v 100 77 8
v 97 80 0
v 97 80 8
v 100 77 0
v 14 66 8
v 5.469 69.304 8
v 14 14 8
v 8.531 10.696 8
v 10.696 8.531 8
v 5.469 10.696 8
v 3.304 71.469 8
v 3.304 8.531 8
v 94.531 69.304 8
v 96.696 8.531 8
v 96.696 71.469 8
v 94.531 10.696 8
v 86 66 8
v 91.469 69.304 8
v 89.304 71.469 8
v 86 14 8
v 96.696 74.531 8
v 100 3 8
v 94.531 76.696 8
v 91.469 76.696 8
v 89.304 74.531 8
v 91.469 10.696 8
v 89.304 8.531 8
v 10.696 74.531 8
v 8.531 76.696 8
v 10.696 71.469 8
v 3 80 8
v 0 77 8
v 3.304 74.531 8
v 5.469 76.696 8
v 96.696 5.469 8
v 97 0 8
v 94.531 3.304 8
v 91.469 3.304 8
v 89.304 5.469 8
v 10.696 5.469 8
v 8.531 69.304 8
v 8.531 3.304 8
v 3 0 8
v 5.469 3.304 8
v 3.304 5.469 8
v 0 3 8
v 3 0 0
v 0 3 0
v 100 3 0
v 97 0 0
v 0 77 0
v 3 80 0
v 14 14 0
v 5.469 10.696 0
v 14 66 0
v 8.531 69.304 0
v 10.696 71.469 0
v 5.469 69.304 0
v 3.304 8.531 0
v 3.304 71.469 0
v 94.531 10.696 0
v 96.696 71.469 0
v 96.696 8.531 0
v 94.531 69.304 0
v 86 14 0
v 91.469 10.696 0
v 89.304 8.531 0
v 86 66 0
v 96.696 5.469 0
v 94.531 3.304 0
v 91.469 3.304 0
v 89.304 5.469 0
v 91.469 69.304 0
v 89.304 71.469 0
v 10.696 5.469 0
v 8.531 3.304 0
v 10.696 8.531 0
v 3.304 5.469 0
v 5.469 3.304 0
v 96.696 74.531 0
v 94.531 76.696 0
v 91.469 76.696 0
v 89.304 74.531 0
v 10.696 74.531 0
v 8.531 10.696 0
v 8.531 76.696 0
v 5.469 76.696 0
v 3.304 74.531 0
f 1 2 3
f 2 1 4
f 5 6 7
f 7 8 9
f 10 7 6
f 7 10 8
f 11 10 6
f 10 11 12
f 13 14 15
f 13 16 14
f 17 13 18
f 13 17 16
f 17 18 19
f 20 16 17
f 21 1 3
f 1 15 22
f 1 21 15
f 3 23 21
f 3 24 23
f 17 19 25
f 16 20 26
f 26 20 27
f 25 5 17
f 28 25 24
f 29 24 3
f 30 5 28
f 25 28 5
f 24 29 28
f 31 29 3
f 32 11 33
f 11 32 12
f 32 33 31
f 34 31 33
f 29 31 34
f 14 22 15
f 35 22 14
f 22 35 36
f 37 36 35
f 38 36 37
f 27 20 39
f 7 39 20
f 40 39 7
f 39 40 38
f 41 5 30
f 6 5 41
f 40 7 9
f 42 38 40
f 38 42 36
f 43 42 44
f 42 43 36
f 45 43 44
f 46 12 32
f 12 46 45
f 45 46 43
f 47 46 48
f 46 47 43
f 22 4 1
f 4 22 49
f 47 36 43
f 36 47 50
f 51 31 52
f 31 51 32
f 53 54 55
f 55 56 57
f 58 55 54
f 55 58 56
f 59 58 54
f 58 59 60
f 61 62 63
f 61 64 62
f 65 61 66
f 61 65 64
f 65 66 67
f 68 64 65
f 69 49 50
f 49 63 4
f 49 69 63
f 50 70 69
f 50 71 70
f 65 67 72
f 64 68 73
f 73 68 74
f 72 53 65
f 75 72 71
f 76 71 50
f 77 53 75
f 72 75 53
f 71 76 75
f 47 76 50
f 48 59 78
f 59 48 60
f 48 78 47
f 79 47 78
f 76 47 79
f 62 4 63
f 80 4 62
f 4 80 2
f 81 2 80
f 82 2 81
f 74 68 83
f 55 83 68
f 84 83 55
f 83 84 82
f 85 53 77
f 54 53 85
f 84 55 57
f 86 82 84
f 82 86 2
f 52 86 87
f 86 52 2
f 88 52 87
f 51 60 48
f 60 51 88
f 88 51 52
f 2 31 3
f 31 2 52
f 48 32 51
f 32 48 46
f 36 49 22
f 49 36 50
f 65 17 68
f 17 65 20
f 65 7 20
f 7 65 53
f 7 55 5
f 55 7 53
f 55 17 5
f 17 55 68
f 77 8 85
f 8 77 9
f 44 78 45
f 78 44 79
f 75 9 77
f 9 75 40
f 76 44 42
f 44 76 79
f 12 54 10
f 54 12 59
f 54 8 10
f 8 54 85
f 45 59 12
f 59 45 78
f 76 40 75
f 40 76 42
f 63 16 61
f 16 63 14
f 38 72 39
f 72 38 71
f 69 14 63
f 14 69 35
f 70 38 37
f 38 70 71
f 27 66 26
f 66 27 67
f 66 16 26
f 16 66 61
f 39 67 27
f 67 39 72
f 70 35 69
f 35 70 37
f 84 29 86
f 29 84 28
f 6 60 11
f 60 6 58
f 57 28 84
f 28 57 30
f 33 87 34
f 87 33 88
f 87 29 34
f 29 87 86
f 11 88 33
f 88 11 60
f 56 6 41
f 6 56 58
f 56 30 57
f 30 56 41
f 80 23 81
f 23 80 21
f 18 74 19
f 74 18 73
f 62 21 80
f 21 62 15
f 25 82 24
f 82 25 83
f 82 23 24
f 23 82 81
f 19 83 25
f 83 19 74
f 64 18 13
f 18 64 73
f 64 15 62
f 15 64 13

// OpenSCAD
$fn = 32;

// ----------------------------------------------------------------------
// Frame plate: 100 x 80 frame, 14 mm rails
// ----------------------------------------------------------------------

// --- parameters (mm) ---
plate_l = 100;            // plate length, X
plate_w = 80;             // plate width, Y
plate_t = 8;              // plate thickness, Z (extrusion height)
corner_c = 3;             // corner chamfer
frame_bar = 14;           // frame rail width
bolt_r = 4;               // corner bolt window radius
bolt_inset = 7;           // bolt centre inset from the edges

win_l = plate_l - 2 * frame_bar;  // window length
win_w = plate_w - 2 * frame_bar;  // window width
bolt_d = 2 * bolt_r;  // corner hole diameter

profile = [[3, 0], [97, 0], [100, 3], [100, 77], [97, 80], [3, 80], [0, 77], [0, 3]];  // primary outline, 8 points, counter clockwise
void_1 = [[14, 14], [86, 14], [86, 66], [14, 66]];  // the window, 4 points
void_2 = [[10.696, 8.531], [8.531, 10.696], [5.469, 10.696], [3.304, 8.531], [3.304, 5.469], [5.469, 3.304], [8.531, 3.304], [10.696, 5.469]];  // corner bolt window, 8 points
void_3 = [[96.696, 8.531], [94.531, 10.696], [91.469, 10.696], [89.304, 8.531], [89.304, 5.469], [91.469, 3.304], [94.531, 3.304], [96.696, 5.469]];  // corner bolt window, 8 points
void_4 = [[10.696, 74.531], [8.531, 76.696], [5.469, 76.696], [3.304, 74.531], [3.304, 71.469], [5.469, 69.304], [8.531, 69.304], [10.696, 71.469]];  // corner bolt window, 8 points
void_5 = [[96.696, 74.531], [94.531, 76.696], [91.469, 76.696], [89.304, 74.531], [89.304, 71.469], [91.469, 69.304], [94.531, 69.304], [96.696, 71.469]];  // corner bolt window, 8 points

// --- the one profile operation ---
difference() {
  linear_extrude(height = plate_t) polygon(points = profile);
  translate([0, 0, -1])
    linear_extrude(height = plate_t + 2) polygon(points = void_1);
  translate([0, 0, -1])
    linear_extrude(height = plate_t + 2) polygon(points = void_2);
  translate([0, 0, -1])
    linear_extrude(height = plate_t + 2) polygon(points = void_3);
  translate([0, 0, -1])
    linear_extrude(height = plate_t + 2) polygon(points = void_4);
  translate([0, 0, -1])
    linear_extrude(height = plate_t + 2) polygon(points = void_5);
}
